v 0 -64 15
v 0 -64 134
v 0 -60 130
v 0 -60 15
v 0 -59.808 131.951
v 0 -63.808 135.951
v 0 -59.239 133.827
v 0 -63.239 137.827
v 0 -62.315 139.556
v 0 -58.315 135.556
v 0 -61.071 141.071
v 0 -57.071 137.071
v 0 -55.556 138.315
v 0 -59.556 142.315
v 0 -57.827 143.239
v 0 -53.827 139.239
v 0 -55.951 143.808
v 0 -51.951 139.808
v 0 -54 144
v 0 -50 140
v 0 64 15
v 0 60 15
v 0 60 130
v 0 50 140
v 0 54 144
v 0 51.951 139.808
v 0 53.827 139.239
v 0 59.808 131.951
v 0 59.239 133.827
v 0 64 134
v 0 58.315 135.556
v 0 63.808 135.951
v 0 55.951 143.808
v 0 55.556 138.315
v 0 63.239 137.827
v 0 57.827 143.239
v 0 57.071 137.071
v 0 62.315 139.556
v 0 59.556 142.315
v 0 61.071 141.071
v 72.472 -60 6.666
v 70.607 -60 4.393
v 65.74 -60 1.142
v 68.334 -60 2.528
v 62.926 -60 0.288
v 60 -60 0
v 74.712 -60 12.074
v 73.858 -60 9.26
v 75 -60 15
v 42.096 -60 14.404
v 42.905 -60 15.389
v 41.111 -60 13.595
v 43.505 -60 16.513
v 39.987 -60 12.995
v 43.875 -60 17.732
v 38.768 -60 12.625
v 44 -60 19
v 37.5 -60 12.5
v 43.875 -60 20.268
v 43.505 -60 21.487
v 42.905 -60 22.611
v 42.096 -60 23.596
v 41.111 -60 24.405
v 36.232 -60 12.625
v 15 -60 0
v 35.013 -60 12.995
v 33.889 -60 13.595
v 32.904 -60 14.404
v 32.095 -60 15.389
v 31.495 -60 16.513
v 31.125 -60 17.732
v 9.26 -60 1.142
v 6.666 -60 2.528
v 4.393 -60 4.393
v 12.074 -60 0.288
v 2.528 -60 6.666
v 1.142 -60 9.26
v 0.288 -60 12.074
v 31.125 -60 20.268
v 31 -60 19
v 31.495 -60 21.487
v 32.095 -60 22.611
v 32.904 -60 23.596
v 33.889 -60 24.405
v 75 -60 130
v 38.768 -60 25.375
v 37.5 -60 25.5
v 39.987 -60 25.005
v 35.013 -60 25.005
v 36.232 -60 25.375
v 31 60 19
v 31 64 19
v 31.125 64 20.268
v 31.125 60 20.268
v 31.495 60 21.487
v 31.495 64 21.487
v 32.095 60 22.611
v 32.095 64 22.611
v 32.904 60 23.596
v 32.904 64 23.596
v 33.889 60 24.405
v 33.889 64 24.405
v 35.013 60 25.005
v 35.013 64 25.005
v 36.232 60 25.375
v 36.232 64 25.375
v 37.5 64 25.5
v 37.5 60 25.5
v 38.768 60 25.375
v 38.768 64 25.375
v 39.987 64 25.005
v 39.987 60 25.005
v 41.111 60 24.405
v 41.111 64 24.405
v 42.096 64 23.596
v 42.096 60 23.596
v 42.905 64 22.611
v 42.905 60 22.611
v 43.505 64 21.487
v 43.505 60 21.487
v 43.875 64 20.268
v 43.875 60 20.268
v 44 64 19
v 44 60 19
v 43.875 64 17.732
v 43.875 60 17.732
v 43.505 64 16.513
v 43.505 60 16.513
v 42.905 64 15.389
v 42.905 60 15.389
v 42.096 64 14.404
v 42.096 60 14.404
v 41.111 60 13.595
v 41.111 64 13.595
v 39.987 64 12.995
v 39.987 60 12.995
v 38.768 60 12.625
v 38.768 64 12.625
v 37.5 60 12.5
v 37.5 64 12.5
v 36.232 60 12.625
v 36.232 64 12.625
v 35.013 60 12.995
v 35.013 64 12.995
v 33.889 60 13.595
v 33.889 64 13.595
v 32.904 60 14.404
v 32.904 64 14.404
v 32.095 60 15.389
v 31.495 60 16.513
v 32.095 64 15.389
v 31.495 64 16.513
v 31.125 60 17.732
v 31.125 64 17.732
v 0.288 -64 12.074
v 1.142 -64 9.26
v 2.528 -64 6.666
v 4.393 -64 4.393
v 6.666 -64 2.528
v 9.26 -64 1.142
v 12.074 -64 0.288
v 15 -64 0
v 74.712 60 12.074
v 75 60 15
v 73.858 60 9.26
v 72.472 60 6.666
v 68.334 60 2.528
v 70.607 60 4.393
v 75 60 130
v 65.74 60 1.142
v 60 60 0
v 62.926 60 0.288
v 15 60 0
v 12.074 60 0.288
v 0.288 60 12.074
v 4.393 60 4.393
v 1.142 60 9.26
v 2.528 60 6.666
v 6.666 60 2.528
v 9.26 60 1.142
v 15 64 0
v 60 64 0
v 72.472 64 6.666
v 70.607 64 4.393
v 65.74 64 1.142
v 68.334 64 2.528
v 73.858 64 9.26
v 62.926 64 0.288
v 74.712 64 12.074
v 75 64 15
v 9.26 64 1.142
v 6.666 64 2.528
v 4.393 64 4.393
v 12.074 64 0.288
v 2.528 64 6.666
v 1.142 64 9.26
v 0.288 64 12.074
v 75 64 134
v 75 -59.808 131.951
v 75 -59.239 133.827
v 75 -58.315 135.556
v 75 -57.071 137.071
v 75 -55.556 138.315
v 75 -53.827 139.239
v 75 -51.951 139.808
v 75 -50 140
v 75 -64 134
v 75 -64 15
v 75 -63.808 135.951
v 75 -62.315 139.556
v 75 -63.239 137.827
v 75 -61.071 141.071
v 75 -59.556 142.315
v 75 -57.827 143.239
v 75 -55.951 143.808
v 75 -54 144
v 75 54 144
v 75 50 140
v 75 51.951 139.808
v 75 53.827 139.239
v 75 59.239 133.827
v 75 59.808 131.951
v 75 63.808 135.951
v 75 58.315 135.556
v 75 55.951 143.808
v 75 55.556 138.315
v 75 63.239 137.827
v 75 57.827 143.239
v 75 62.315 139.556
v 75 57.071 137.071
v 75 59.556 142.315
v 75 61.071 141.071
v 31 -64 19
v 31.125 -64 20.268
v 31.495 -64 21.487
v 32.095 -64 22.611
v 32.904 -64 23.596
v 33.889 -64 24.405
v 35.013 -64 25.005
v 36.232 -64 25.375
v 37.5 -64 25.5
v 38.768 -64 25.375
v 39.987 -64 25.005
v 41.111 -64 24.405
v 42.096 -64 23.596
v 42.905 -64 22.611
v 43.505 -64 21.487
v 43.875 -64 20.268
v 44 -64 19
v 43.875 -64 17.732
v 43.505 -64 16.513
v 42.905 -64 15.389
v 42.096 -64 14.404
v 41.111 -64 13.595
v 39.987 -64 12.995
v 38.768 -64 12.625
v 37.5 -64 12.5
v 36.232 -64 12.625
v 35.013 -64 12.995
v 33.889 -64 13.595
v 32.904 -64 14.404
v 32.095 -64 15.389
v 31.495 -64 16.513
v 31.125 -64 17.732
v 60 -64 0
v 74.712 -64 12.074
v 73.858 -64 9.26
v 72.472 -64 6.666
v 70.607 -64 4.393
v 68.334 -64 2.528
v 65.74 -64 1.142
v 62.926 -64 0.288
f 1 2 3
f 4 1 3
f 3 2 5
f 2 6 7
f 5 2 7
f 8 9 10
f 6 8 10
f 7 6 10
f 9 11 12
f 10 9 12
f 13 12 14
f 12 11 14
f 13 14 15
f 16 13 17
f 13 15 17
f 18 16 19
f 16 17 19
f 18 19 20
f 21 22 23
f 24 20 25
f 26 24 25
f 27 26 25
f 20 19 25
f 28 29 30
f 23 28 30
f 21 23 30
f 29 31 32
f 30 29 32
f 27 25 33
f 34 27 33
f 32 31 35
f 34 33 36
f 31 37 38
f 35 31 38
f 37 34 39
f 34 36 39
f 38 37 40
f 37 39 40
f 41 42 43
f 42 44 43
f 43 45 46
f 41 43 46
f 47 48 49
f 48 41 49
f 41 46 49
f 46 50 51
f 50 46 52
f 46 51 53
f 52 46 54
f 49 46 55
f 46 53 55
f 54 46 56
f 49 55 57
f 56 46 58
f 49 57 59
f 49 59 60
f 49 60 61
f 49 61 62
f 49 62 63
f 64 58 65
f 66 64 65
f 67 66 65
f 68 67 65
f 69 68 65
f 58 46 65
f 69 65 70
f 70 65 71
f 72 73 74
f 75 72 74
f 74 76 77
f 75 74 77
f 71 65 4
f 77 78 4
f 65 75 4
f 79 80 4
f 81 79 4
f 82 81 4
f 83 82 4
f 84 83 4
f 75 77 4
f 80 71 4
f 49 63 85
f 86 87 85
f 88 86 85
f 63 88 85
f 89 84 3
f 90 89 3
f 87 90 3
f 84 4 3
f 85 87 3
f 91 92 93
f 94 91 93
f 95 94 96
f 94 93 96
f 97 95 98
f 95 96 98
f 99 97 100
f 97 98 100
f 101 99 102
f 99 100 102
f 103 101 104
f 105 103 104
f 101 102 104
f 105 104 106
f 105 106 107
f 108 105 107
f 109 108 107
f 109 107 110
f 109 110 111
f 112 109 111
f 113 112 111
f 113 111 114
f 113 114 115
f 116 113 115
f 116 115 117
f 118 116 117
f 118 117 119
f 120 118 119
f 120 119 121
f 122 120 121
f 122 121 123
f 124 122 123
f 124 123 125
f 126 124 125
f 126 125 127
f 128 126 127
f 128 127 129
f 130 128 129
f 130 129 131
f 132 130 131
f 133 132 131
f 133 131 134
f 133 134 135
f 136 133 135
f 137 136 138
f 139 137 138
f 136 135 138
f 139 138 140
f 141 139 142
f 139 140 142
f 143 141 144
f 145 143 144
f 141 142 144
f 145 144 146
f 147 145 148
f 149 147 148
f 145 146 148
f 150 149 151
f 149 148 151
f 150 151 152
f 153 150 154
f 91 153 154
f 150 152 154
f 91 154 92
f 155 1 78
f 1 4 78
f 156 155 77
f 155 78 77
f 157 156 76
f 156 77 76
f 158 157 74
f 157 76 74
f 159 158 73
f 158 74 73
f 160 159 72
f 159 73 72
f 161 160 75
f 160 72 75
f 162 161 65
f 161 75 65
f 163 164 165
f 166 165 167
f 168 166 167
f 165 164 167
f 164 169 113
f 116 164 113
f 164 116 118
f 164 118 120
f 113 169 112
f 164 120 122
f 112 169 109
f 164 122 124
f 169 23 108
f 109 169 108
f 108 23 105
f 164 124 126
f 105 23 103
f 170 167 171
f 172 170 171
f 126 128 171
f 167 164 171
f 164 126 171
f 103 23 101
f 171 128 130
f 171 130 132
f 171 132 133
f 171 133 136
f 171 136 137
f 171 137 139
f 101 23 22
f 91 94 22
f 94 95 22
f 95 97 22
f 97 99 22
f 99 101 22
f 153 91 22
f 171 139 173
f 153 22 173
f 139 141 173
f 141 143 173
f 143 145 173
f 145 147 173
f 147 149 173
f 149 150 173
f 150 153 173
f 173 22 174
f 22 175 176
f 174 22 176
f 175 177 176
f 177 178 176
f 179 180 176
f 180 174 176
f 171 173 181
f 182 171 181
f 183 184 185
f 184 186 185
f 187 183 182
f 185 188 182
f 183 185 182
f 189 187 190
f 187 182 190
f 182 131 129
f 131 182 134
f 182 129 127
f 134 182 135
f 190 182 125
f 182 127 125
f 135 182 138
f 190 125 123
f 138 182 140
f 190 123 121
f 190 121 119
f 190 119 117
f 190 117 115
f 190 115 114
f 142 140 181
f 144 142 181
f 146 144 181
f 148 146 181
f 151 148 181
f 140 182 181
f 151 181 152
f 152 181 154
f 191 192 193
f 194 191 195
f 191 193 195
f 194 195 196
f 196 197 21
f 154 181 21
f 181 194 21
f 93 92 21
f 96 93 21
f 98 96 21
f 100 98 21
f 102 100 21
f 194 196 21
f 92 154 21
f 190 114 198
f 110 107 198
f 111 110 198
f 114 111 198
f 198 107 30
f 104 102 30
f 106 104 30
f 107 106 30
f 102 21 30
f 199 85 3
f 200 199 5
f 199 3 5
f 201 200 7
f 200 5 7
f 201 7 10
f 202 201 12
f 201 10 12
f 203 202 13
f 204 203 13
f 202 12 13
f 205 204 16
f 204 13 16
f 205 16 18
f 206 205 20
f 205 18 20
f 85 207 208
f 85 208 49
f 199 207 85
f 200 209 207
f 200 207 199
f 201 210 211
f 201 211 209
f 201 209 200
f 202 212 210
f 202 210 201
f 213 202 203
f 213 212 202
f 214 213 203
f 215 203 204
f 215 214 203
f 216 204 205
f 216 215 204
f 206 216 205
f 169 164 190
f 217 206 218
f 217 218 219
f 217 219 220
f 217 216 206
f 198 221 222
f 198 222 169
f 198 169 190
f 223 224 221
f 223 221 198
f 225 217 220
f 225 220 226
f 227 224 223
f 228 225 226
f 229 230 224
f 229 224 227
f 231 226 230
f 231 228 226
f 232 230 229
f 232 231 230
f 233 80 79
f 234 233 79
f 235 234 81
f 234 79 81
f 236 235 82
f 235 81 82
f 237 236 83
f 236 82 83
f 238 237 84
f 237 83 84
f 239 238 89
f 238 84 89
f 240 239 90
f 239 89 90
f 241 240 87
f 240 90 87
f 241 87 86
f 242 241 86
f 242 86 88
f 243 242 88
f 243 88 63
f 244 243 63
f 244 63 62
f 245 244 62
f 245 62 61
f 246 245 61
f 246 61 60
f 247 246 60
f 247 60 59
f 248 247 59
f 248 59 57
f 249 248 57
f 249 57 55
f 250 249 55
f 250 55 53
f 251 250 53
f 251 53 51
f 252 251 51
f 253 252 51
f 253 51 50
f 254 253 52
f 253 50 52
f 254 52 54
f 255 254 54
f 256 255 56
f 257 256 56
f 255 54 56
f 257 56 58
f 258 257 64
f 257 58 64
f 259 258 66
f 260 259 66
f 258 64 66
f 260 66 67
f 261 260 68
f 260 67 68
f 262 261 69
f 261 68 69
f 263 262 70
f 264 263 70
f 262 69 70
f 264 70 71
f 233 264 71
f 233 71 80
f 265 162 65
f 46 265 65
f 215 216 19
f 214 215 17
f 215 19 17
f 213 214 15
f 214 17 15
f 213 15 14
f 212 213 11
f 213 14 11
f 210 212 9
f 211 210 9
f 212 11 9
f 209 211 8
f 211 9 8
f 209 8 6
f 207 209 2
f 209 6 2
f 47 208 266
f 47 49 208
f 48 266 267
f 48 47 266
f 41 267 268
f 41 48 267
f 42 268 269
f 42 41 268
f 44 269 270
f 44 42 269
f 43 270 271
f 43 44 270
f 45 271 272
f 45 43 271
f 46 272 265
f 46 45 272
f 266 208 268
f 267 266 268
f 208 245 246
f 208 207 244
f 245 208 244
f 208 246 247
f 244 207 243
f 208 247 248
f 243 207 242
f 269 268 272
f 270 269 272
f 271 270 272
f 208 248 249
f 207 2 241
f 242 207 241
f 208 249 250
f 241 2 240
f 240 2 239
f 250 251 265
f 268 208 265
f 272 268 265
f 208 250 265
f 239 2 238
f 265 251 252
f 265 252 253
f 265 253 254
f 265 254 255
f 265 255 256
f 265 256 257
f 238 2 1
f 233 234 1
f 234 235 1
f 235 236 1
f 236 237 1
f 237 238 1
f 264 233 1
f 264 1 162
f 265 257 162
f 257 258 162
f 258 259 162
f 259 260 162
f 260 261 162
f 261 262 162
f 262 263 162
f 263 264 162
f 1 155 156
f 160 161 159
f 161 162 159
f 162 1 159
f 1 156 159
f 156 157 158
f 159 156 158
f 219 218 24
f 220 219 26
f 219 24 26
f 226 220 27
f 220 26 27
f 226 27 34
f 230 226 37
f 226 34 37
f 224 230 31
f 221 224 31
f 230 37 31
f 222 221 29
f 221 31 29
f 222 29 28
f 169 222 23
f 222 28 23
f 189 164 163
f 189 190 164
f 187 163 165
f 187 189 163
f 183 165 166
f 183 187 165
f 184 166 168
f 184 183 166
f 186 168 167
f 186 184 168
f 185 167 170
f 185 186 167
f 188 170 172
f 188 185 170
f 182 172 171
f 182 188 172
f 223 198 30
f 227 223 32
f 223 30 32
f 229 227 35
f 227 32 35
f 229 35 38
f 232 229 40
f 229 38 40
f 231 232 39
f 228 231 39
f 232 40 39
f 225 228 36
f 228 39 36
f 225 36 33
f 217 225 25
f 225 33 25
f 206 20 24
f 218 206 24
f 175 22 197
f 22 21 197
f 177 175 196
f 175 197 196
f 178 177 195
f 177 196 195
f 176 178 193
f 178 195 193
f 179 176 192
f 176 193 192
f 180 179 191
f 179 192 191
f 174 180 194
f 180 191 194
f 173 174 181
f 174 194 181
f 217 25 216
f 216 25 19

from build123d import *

# Parameters (mm, degrees)
F1_DEPTH = 75
F3_D     = 13
F3_DEPTH = 500
F4_R     = 15


with BuildPart() as f1:
    # F0 (on Right) → F1 (new body)
    with BuildSketch(Plane.YZ):
        with BuildLine():
            Line((-64, 134), (-64, 0))
            Line((-64, 0), (-60, 0))
            Line((-60, 0), (-60, 130))
            ThreePointArc((-60, 130), (-57.071068, 137.071068), (-50, 140))
            Line((-50, 140), (50, 140))
            ThreePointArc((50, 140), (57.071068, 137.071068), (60, 130))
            Line((60, 130), (60, 0))
            Line((60, 0), (64, 0))
            Line((64, 0), (64, 134))
            ThreePointArc((64, 134), (61.071068, 141.071068), (54, 144))
            Line((54, 144), (-54, 144))
            ThreePointArc((-54, 144), (-61.071068, 141.071068), (-64, 134))
        make_face()
    extrude(amount=F1_DEPTH)

    # F3
    with Locations(Plane.XZ.offset(64)):
        with Locations((37.5, 19)):
            Hole(F3_D / 2, depth=F3_DEPTH)

    # F4
    f4_edges = [f1.edges().sort_by_distance(p)[0] for p in [
        (0, -62, 0),
        (75, -62, 0),
        (75, 62, 0),
        (0, 62, 0),
    ]]
    fillet(f4_edges, radius=F4_R)


solid = f1.part
